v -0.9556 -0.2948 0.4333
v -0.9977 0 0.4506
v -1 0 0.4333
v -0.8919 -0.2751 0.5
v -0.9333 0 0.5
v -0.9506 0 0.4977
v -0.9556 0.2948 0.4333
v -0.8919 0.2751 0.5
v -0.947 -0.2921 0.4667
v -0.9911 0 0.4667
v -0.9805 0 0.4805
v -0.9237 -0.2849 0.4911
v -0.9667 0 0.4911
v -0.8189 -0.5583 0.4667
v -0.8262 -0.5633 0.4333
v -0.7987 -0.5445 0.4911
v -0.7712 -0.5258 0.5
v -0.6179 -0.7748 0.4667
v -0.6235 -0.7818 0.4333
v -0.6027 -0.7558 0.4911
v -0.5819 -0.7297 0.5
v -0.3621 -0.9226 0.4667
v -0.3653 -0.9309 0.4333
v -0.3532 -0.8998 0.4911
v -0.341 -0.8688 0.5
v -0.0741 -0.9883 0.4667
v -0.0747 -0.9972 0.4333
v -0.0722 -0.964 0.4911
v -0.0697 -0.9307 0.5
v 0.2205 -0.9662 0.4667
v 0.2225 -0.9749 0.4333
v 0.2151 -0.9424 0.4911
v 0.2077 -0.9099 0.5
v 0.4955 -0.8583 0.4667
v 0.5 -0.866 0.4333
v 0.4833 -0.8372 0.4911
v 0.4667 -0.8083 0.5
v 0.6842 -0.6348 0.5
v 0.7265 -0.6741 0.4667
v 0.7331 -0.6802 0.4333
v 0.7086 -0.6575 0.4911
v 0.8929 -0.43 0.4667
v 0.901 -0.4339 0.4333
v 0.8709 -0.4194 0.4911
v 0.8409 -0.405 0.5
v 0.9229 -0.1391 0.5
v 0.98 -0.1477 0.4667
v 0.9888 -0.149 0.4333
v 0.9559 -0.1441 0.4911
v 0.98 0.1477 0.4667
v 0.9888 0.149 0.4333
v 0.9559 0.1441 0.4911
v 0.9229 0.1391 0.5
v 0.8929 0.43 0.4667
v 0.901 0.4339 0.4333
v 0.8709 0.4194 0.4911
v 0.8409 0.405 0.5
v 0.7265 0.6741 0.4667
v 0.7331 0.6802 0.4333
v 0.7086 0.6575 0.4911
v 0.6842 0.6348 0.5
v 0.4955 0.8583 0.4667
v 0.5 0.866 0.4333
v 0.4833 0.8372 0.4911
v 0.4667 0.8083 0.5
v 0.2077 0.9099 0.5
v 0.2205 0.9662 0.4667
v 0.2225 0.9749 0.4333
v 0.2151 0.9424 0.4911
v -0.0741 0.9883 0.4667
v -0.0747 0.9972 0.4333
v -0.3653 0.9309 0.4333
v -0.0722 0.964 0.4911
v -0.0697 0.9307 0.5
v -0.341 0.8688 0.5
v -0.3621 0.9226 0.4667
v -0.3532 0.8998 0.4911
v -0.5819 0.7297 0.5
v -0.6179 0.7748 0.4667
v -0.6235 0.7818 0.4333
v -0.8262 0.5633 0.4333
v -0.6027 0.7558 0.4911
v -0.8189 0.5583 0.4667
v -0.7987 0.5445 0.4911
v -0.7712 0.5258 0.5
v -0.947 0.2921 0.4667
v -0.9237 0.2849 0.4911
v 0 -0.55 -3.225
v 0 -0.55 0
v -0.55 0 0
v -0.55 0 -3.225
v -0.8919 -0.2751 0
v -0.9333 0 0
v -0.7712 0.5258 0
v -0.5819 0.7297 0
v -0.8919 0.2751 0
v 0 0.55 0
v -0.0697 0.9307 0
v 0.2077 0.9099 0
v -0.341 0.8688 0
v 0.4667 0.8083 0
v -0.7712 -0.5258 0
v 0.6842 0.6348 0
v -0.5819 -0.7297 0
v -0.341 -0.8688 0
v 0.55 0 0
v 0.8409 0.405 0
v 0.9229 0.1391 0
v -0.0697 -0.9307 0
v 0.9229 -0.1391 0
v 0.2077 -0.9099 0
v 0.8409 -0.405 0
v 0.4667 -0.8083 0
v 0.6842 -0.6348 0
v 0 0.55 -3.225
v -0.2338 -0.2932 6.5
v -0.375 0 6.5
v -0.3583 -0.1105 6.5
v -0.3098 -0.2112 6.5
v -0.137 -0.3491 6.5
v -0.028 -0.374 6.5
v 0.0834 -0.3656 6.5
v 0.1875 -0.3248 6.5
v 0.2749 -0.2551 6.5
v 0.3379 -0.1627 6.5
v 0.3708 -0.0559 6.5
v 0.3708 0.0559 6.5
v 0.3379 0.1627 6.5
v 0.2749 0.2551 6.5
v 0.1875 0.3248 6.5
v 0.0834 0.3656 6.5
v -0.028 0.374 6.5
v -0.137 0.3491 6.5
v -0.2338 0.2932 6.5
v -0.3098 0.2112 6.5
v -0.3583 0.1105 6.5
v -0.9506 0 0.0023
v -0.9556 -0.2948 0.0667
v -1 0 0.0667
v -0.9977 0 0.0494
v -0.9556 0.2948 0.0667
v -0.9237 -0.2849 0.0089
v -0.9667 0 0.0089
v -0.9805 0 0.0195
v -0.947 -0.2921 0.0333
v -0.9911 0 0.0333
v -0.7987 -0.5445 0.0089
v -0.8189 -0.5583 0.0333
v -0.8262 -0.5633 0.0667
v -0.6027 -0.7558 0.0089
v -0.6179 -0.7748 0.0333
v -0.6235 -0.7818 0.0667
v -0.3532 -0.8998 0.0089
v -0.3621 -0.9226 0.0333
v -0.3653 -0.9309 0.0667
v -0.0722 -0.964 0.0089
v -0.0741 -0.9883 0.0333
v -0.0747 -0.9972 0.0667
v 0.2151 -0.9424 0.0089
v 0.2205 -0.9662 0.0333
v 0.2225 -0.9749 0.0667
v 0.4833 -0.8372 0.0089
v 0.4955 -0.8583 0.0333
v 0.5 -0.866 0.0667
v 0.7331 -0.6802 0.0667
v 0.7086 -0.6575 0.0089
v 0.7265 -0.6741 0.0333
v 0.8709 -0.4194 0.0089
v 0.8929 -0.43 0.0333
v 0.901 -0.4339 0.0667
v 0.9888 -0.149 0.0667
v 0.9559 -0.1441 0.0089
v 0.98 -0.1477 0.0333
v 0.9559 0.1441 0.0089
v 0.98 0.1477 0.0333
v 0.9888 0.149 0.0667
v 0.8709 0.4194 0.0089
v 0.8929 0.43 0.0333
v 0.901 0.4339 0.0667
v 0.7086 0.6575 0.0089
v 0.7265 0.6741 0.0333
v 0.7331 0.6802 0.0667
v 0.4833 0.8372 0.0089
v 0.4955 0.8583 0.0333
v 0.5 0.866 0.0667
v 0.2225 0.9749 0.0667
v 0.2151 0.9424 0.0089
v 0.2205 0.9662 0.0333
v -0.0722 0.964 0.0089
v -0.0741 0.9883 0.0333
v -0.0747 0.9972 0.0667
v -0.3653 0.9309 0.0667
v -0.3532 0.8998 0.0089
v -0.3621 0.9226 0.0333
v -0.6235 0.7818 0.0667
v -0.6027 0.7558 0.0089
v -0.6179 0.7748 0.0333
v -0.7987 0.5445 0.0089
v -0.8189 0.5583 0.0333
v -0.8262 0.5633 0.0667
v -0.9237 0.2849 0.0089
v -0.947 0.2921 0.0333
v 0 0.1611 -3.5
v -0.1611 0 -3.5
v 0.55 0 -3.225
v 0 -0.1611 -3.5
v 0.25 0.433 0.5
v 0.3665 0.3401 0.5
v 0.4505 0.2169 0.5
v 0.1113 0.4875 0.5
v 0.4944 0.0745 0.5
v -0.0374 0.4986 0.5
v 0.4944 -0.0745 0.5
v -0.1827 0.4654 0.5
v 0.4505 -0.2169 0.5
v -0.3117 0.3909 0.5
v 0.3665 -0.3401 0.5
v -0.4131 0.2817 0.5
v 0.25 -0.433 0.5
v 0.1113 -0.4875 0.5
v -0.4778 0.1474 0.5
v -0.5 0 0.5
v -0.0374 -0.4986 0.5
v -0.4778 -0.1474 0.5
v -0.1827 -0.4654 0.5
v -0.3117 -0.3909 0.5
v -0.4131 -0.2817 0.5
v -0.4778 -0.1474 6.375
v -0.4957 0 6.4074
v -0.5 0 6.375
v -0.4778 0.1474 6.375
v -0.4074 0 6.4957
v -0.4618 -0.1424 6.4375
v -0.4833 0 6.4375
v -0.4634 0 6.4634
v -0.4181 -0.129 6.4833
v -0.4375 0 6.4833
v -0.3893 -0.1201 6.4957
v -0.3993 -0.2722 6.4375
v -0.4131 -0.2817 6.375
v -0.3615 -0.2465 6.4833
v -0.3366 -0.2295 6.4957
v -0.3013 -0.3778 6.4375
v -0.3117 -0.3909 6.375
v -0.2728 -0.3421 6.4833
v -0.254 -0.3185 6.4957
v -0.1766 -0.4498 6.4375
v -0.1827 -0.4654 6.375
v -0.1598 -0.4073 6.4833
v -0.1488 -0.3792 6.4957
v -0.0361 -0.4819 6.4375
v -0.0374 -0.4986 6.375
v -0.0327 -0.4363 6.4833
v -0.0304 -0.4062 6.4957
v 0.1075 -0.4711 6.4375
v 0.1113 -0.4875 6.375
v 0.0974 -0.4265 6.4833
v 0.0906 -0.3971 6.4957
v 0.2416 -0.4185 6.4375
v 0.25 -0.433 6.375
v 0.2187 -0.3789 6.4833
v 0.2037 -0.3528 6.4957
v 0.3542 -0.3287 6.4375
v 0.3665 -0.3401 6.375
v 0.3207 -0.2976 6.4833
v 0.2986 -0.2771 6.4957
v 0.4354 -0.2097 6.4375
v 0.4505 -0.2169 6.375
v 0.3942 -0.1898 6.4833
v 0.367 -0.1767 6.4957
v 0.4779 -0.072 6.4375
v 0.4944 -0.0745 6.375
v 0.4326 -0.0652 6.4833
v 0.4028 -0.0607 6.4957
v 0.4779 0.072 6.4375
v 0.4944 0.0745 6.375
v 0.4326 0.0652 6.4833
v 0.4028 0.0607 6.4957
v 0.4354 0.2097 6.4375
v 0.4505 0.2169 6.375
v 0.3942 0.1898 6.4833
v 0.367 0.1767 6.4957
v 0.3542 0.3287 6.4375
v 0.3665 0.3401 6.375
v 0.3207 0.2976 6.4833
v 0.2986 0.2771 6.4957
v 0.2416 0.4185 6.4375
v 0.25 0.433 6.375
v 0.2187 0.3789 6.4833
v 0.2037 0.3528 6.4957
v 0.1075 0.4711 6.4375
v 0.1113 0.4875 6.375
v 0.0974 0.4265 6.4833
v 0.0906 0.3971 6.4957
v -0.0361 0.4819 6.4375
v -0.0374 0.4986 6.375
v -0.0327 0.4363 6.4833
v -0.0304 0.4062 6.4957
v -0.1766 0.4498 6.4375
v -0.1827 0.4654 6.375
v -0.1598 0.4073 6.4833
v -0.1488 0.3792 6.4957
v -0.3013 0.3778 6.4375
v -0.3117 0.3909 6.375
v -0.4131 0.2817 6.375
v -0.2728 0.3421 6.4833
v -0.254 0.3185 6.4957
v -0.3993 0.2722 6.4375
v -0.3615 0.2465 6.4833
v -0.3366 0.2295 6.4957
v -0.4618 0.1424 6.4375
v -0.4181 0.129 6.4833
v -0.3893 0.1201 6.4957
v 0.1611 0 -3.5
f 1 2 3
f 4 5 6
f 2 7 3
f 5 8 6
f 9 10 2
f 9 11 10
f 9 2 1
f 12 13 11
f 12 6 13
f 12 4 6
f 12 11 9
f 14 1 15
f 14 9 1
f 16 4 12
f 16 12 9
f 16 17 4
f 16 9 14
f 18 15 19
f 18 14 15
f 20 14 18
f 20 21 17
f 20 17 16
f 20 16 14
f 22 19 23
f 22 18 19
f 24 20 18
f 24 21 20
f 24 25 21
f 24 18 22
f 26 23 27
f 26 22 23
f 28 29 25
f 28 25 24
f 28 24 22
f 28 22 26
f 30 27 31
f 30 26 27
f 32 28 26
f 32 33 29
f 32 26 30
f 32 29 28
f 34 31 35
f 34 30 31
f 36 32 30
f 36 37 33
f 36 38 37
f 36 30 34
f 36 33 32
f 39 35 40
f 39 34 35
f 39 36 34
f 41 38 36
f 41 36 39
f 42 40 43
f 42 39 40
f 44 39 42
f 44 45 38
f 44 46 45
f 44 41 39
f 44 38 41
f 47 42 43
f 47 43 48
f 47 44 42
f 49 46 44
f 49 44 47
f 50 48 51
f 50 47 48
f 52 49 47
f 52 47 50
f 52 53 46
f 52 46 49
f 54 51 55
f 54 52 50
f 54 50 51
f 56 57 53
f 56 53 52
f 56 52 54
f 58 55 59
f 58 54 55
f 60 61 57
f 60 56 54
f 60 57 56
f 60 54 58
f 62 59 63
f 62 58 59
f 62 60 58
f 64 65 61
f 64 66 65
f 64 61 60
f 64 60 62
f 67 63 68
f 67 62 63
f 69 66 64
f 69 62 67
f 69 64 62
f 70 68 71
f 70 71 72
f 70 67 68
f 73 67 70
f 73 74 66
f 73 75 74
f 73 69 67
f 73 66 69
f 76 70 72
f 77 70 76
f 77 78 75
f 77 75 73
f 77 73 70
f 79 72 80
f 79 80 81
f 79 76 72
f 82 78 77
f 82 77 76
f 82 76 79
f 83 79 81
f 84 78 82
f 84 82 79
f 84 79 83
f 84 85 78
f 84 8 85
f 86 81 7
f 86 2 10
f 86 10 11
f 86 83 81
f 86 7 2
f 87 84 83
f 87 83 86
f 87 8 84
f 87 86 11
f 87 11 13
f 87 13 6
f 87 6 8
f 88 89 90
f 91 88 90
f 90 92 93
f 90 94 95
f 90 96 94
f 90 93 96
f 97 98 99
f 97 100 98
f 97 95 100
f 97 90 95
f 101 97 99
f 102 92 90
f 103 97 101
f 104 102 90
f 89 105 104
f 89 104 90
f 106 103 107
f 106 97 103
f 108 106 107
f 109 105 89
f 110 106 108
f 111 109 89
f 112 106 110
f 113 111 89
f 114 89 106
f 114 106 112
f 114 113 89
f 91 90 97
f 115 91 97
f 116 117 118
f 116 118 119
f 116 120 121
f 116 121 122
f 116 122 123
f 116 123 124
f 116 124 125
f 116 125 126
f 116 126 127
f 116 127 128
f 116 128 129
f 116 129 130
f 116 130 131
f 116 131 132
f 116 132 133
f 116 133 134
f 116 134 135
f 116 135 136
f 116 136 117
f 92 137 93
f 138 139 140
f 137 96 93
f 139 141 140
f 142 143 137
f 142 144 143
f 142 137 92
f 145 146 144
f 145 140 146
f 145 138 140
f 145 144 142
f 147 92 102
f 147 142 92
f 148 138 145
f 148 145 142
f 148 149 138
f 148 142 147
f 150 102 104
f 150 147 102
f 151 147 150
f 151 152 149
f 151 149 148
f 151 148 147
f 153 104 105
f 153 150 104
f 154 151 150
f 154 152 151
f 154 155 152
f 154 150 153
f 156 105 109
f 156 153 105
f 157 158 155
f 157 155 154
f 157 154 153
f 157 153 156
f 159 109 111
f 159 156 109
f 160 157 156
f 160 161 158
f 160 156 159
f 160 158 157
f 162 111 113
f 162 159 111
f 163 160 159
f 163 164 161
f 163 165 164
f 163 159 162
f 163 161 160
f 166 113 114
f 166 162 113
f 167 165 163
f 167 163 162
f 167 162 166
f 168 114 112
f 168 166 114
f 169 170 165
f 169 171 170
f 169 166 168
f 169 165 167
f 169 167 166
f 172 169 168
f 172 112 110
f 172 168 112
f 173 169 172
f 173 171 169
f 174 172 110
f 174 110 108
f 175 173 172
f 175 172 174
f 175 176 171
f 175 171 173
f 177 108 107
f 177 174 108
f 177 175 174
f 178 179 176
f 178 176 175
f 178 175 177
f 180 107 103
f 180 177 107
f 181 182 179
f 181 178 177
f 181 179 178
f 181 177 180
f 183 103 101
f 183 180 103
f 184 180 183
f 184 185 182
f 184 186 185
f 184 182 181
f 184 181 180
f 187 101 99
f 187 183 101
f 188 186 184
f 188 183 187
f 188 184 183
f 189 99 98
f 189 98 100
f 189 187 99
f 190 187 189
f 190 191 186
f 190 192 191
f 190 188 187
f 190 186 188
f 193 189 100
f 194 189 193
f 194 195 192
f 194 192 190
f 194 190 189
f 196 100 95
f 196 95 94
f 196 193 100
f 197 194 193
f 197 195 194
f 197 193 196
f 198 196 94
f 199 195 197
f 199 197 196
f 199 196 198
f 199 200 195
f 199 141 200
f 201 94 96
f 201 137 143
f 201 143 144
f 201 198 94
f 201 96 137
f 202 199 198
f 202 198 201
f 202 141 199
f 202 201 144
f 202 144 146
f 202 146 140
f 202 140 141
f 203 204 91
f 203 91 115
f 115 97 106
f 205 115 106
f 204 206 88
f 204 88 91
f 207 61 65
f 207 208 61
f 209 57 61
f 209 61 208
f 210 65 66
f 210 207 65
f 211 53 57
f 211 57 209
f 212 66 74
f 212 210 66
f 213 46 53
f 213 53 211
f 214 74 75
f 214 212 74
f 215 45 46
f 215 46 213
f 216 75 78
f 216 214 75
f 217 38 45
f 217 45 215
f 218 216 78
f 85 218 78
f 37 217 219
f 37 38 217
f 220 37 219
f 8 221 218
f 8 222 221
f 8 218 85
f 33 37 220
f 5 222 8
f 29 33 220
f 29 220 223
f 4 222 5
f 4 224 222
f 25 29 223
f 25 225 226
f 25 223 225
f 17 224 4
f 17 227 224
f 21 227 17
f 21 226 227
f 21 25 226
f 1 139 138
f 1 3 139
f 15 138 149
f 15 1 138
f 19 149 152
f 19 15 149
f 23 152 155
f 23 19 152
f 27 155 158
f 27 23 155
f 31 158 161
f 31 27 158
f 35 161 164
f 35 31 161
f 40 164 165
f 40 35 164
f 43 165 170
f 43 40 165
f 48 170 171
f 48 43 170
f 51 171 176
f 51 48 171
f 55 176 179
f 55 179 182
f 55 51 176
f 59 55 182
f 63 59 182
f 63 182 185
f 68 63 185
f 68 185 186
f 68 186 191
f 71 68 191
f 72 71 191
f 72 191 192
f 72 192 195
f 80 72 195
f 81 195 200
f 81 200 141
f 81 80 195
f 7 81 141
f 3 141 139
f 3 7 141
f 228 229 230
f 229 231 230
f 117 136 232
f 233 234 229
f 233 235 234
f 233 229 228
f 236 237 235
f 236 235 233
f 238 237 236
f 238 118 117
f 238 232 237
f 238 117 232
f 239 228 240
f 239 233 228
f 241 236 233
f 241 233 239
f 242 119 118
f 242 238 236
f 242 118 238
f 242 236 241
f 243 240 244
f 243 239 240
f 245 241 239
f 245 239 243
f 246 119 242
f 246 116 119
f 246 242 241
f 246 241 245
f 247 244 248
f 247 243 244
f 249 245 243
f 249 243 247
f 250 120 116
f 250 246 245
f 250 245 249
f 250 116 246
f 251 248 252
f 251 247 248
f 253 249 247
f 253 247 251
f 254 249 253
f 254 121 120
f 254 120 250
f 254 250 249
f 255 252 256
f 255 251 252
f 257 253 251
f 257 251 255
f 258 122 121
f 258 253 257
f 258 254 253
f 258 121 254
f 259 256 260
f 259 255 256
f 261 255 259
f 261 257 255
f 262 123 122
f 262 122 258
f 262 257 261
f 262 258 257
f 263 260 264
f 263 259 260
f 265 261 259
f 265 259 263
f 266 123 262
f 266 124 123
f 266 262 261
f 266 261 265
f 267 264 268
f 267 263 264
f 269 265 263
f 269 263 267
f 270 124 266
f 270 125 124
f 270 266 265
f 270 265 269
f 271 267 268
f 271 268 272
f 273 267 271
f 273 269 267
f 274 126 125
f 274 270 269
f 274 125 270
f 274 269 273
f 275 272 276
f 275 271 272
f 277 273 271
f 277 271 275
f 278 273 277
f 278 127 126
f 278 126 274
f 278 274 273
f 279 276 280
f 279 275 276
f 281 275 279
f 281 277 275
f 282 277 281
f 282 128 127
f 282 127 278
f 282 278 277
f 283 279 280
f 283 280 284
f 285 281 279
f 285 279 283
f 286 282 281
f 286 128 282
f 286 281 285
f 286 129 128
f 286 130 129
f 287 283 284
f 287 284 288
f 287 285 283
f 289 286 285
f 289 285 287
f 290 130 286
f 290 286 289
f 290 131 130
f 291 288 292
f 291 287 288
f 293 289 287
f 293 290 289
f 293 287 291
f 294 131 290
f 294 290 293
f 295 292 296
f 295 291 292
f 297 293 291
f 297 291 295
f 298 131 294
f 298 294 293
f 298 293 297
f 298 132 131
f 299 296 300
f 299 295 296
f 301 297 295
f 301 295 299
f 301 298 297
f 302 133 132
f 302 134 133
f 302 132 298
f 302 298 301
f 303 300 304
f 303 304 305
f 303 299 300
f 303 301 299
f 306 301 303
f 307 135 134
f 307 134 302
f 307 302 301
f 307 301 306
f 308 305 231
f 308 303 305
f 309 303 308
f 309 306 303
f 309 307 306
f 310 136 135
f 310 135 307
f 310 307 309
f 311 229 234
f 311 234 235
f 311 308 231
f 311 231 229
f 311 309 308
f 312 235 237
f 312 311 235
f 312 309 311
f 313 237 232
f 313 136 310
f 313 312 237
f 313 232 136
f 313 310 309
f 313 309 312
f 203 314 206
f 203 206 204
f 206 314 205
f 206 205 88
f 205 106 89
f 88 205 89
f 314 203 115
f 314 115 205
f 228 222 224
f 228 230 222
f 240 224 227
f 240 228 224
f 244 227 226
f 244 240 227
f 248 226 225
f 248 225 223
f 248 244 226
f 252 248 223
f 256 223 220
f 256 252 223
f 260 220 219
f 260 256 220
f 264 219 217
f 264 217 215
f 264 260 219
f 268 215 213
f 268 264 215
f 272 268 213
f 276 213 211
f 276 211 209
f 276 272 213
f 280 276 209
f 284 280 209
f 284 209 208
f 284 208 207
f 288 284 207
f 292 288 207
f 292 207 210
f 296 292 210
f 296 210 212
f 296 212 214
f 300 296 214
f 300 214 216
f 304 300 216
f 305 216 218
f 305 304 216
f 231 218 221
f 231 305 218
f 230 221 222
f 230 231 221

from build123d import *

# Parameters (mm, degrees)
PAD_DEPTH    = 3.5
CHAMFER_SIZE = 0.275


with BuildPart() as part:
    # Sketch → Revolution (revolve)
    with BuildSketch(Plane(origin=(0, 0, 0), x_dir=(-1, 0, 0), z_dir=(0, 1, 0))):
        with BuildLine():
            Line((0, 0), (0.933333, 0))
            ThreePointArc((0.933333, 0), (0.980474, 0.019526), (1, 0.066667))
            Line((1, 0.066667), (1, 0.433333))
            ThreePointArc((1, 0.433333), (0.980474, 0.480474), (0.933333, 0.5))
            Line((0.933333, 0.5), (0.5, 0.5))
            Line((0.5, 0.5), (0.5, 6.375))
            ThreePointArc((0.5, 6.375), (0.463388, 6.463388), (0.375, 6.5))
            Line((0.375, 6.5), (0, 6.5))
            Line((0, 6.5), (0, 0))
        make_face()
    revolve(axis=Axis((0, 0, 0), (0, 0, 1)))

    # Sketch001 → Pad (new body)
    with BuildSketch(Plane.XY):
        Polygon((-0.55, 0), (0, 0.55), (0.55, 0), (0, -0.55), align=None)
    extrude(amount=-PAD_DEPTH)

    # Chamfer
    chamfer_edges = [part.edges().sort_by_distance(p)[0] for p in [
        (0.275, -0.275, -3.5),
        (-0.275, -0.275, -3.5),
        (-0.275, 0.275, -3.5),
        (0.275, 0.275, -3.5),
    ]]
    chamfer(chamfer_edges, length=CHAMFER_SIZE)


solid = part.part
